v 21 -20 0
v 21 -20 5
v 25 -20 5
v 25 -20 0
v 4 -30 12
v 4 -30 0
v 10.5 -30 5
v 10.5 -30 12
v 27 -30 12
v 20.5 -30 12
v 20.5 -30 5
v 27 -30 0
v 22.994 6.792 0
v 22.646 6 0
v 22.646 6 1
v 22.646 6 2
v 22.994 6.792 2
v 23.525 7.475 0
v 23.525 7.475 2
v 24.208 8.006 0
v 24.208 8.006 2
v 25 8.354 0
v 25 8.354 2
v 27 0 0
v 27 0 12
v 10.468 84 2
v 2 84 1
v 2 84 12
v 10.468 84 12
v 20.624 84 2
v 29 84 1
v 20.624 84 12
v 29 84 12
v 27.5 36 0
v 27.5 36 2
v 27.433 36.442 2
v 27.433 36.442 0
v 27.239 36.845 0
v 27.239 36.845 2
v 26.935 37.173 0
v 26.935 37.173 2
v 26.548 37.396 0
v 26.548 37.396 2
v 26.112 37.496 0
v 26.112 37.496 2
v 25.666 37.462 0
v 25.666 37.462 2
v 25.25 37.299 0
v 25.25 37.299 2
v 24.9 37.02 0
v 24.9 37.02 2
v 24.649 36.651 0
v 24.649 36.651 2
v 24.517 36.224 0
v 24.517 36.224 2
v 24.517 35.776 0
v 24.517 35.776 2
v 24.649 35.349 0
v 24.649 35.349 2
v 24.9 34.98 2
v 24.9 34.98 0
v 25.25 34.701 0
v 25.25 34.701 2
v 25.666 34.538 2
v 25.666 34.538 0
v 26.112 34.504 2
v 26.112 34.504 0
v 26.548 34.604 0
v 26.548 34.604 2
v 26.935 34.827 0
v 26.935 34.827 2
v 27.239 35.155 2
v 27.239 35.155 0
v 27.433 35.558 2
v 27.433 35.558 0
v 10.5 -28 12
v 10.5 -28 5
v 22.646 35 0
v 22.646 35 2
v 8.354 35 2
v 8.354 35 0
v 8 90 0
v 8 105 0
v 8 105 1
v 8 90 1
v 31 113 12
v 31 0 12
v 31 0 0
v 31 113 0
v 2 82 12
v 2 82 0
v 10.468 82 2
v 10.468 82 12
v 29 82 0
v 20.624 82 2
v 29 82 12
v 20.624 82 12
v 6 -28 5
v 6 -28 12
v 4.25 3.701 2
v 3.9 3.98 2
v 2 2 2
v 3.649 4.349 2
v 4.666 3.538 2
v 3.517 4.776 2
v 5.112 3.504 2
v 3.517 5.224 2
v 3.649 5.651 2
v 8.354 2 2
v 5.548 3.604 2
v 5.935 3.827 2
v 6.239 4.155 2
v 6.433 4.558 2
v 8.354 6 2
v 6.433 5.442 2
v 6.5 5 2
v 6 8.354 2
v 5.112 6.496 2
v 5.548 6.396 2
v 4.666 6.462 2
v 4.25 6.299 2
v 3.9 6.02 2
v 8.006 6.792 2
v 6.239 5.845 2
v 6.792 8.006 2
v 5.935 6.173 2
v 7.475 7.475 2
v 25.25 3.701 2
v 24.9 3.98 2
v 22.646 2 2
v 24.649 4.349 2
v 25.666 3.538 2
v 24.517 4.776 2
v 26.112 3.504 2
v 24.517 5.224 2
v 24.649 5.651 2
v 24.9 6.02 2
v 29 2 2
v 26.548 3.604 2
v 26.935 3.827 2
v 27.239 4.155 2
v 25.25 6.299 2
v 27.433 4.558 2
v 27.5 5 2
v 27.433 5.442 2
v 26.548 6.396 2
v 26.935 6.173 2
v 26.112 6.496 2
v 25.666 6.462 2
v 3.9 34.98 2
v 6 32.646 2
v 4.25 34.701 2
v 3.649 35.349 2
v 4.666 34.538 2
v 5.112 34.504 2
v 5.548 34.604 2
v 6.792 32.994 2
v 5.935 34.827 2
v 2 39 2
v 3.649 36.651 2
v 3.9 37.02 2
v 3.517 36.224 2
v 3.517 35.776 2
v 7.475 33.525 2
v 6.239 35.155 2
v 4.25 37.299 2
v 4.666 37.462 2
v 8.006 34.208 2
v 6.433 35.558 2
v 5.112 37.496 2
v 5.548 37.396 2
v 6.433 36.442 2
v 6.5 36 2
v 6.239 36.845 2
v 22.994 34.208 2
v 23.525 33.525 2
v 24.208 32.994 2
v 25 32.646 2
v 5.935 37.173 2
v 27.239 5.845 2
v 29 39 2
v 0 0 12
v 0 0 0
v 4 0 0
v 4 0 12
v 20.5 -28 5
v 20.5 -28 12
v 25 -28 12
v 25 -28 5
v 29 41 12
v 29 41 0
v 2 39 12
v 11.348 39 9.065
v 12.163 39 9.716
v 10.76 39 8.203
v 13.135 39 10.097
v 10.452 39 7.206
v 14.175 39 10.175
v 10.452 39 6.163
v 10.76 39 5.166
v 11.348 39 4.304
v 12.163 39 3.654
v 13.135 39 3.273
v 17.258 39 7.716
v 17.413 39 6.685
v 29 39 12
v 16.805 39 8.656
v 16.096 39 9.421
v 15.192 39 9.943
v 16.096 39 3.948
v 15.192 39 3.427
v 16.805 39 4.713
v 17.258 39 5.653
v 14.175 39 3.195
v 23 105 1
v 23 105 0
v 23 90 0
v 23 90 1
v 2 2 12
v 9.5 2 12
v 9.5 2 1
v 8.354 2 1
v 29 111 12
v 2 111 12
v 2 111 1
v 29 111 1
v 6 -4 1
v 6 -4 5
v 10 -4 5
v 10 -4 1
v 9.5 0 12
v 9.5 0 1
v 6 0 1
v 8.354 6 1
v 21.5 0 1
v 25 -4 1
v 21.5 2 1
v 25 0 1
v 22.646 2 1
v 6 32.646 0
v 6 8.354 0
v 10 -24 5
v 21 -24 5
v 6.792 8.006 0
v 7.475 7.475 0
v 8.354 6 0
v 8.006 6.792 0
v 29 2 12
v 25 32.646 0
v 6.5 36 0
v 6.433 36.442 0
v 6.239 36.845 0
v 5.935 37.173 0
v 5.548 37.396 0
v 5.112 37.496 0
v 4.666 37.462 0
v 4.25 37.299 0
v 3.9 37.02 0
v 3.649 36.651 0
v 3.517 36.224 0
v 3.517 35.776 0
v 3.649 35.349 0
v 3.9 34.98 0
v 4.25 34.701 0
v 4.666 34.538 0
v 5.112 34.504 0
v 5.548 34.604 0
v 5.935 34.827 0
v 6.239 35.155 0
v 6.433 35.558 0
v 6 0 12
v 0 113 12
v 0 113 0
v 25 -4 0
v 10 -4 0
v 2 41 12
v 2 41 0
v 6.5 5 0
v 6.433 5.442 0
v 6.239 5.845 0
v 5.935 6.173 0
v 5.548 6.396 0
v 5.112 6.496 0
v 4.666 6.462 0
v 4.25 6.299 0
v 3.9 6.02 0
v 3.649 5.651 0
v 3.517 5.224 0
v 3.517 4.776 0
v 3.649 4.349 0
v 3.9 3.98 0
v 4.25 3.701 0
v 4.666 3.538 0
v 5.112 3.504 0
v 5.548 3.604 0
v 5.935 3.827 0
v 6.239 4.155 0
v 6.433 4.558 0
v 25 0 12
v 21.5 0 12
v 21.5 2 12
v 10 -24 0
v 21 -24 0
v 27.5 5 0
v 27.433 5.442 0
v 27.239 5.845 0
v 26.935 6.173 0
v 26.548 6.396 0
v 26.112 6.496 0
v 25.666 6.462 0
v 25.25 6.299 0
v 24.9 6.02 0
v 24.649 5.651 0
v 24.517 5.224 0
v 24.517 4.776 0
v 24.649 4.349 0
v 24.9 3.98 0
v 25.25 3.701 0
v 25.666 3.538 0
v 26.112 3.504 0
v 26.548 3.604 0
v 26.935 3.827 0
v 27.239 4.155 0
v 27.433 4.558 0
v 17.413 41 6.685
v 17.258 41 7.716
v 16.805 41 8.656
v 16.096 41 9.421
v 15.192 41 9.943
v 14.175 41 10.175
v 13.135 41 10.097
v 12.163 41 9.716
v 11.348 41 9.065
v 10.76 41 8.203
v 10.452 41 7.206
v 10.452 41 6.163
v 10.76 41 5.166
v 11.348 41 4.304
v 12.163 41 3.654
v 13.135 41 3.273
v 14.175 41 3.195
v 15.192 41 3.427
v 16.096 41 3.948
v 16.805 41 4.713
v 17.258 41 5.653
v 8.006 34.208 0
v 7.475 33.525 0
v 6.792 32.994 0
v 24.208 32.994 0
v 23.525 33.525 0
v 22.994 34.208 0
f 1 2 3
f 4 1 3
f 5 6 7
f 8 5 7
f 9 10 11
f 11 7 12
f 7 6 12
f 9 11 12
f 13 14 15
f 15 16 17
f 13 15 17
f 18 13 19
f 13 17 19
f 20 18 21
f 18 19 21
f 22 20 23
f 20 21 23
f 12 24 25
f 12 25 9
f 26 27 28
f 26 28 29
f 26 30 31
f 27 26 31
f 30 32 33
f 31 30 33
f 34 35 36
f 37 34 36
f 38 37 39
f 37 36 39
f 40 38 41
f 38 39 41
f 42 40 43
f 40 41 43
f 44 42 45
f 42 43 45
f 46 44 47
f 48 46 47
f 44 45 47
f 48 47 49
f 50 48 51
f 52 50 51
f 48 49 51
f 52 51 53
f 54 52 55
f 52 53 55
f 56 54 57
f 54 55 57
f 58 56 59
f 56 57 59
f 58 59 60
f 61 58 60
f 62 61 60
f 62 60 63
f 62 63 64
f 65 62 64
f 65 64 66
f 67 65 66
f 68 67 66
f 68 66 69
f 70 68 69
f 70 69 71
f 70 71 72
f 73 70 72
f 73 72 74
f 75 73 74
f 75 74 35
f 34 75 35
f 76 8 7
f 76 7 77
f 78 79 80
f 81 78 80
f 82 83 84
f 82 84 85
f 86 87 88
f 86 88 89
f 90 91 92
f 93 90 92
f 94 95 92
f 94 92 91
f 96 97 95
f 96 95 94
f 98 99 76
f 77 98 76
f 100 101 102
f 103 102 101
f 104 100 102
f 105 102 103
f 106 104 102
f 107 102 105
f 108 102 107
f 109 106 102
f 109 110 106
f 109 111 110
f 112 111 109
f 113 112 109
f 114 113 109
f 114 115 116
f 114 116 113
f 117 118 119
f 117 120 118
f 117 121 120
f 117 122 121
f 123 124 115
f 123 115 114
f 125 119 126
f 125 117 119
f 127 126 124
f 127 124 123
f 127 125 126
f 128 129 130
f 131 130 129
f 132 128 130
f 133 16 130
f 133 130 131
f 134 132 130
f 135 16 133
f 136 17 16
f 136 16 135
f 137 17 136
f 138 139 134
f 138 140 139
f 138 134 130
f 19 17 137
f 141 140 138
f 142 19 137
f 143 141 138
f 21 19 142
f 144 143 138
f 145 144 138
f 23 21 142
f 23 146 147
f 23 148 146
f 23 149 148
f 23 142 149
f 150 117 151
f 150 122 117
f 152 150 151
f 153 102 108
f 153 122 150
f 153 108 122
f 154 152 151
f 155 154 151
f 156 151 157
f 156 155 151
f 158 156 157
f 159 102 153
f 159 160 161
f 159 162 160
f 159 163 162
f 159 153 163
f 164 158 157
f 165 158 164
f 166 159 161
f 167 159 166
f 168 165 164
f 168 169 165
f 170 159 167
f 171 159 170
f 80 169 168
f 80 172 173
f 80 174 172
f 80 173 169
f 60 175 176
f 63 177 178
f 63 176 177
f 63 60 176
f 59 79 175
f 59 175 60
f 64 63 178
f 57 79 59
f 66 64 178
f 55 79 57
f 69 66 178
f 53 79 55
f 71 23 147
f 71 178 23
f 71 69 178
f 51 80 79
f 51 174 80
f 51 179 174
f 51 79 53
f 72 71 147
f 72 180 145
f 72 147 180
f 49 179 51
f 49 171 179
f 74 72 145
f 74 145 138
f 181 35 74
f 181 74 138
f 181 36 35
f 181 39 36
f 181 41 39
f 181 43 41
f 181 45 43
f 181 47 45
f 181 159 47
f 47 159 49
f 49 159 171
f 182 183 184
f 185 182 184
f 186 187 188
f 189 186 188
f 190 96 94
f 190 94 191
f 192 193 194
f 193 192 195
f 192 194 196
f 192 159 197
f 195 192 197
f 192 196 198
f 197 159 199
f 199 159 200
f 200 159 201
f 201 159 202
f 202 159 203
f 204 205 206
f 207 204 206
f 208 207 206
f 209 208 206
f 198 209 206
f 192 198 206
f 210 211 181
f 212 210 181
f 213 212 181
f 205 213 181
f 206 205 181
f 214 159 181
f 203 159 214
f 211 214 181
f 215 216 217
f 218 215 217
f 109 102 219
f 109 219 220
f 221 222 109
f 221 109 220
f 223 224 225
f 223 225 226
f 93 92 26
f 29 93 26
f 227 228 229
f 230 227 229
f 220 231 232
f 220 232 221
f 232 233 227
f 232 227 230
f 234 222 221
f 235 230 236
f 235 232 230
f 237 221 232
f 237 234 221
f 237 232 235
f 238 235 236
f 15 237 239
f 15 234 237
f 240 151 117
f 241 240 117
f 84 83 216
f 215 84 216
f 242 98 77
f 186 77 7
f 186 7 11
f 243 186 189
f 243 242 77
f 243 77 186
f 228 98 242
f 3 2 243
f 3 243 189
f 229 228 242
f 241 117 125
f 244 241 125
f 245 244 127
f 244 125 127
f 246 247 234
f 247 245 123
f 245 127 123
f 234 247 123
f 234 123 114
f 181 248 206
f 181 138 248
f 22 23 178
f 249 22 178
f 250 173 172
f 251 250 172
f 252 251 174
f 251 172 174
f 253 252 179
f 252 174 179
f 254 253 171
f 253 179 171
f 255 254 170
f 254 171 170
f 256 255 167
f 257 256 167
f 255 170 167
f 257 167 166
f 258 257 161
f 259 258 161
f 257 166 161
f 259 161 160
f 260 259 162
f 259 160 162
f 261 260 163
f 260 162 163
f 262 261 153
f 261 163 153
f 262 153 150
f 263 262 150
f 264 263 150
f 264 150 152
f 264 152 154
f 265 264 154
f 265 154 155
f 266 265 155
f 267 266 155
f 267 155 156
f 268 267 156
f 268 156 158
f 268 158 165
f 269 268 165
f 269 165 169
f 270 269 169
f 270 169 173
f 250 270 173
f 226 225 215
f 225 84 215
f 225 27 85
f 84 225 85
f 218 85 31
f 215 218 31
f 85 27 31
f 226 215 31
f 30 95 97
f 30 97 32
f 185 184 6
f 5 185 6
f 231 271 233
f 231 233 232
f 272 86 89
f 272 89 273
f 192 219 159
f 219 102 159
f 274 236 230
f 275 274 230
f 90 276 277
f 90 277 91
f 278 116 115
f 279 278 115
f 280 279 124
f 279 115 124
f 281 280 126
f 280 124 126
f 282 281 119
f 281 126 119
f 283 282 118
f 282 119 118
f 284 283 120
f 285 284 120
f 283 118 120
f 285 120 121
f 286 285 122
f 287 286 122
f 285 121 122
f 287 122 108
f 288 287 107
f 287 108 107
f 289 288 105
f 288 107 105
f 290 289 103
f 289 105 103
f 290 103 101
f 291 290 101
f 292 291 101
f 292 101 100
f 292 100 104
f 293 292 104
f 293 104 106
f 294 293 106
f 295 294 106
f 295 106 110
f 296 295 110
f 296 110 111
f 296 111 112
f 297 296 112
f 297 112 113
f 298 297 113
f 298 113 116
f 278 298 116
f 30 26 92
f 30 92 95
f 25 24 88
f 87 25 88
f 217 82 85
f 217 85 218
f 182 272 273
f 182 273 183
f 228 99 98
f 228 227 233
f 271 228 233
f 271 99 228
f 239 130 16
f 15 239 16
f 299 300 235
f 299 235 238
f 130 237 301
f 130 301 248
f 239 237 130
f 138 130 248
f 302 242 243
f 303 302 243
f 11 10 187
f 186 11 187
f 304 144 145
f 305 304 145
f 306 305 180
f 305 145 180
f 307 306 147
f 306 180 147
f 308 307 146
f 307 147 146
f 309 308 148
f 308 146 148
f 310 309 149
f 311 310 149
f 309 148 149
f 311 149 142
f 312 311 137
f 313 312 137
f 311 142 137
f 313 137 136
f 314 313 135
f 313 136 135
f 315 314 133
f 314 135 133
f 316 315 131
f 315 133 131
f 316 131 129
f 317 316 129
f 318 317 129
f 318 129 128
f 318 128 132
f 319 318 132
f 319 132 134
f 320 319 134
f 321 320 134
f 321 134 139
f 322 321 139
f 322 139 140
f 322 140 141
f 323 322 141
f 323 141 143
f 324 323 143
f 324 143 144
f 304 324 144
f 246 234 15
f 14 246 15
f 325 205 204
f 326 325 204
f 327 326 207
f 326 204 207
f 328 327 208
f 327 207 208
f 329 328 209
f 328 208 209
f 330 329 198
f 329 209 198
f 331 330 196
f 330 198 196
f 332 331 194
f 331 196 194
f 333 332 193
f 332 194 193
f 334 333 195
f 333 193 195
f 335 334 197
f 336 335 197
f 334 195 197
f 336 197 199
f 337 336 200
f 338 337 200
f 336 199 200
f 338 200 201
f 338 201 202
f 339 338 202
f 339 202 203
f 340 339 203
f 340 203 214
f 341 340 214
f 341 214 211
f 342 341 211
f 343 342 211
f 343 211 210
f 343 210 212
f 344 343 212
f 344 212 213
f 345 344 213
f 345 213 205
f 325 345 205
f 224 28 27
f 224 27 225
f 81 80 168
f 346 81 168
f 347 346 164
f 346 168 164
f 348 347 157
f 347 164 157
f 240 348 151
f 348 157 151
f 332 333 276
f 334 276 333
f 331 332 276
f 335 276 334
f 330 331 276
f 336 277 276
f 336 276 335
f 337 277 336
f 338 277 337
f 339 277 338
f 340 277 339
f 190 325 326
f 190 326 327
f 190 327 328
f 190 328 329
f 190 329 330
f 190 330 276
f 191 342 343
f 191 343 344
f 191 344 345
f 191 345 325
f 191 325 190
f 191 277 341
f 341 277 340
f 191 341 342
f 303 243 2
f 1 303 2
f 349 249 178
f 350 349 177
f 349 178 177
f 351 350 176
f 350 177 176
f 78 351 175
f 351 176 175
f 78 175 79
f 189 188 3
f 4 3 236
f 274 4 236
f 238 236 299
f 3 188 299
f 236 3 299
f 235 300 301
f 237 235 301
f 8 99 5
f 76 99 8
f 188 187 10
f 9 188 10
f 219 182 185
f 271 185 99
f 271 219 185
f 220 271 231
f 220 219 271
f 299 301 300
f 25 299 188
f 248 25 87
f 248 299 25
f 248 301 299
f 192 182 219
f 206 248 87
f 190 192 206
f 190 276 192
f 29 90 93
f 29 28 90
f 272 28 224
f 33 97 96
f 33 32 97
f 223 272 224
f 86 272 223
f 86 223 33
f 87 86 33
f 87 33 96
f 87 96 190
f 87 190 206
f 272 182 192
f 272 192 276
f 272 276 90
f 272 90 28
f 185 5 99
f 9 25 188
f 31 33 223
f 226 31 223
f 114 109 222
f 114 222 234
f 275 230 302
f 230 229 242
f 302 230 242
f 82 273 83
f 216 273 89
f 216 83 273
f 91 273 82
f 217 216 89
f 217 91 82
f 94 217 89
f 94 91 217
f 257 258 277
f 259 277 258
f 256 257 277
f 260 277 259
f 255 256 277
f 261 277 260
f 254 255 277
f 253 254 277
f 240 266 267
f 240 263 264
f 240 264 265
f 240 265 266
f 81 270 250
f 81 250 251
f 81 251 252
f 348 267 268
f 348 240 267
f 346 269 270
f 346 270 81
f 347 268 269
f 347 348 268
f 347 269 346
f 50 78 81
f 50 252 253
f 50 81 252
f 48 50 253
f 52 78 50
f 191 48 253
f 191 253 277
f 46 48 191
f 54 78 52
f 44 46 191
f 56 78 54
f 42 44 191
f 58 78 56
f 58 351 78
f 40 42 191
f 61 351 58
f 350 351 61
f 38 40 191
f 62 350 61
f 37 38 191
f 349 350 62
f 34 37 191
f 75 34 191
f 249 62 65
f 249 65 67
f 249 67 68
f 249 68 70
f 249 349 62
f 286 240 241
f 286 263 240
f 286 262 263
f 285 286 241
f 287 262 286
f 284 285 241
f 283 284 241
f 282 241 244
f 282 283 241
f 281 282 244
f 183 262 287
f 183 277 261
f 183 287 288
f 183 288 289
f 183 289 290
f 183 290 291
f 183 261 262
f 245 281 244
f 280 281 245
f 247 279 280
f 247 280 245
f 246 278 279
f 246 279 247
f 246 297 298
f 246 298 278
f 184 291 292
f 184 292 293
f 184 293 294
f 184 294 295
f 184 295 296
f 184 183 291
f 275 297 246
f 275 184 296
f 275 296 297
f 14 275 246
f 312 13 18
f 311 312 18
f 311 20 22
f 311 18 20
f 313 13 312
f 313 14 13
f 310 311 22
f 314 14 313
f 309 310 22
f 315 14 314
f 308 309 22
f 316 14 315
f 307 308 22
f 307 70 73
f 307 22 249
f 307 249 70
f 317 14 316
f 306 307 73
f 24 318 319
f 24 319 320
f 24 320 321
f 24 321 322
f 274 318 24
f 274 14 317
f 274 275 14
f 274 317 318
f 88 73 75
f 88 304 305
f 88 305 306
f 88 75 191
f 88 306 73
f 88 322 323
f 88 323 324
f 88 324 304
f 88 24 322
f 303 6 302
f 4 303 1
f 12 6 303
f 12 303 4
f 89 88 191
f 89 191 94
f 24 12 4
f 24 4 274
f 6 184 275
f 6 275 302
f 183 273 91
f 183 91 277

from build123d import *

# Parameters (mm, degrees)
F0_W      = 31
F0_H      = 41
F1_DEPTH  = 12
F2_T      = -2
F3_R      = 1.5
F4_DEPTH  = 25
F6_DEPTH  = 25
F7_W      = 14.291796
F7_H      = 4
F8_DEPTH  = 1
F9_W      = 12
F9_H      = 2
F10_DEPTH = 11
F11_W     = 23
F11_H     = 30
F12_DEPTH = 12
F13_W     = 19
F13_H     = 28
F14_DEPTH = 7
F15_W     = 19
F15_H     = 4
F16_DEPTH = 4
F18_DEPTH = 25
F19_R     = 3.5
F20_DEPTH = 25
F21_W     = 27
F21_H     = 27
F22_DEPTH = 12
F23_W     = 27
F23_H     = 27
F23_W_2   = 15
F23_H_2   = 15
F24_DEPTH = 1
F25_W     = 10.156876
F25_H     = 2
F26_DEPTH = 10
F27_W     = 10
F27_H     = 2
F28_DEPTH = 7


with BuildPart() as f1:
    # F0 (on Top) → F1 (new body)
    with BuildSketch(Plane.XY):
        with Locations((15.5, 20.5)):
            Rectangle(F0_W, F0_H)
    extrude(amount=F1_DEPTH)

    # F2
    f2_openings = [f1.faces().sort_by_distance(p)[0] for p in [
        (15.5, 20.5, 12),
    ]]
    offset(amount=F2_T, openings=f2_openings)

    # F3 (on face) → F4 (cut)
    with BuildSketch(Plane.XY.offset(2)):
        with Locations((5, 36)):
            Circle(F3_R)
        with Locations((26, 36)):
            Circle(F3_R)
        with Locations((26, 5)):
            Circle(F3_R)
        with Locations((5, 5)):
            Circle(F3_R)
    extrude(amount=-F4_DEPTH, mode=Mode.SUBTRACT)

    # F5 (on face) → F6 (cut)
    with BuildSketch(Plane.XY.offset(2)):
        with BuildLine():
            ThreePointArc((25, 32.645898), (23.525126, 33.525126), (22.645898, 35))
            Line((22.645898, 35), (8.354102, 35))
            ThreePointArc((8.354102, 35), (7.474874, 33.525126), (6, 32.645898))
            Line((6, 32.645898), (6, 8.354102))
            ThreePointArc((6, 8.354102), (7.474874, 7.474874), (8.354102, 6))
            Line((8.354102, 6), (22.645898, 6))
            ThreePointArc((22.645898, 6), (23.525126, 7.474874), (25, 8.354102))
            Line((25, 8.354102), (25, 32.645898))
        make_face()
    extrude(amount=-F6_DEPTH, mode=Mode.SUBTRACT)

    # F7 (on face) → F8 (cut)
    with BuildSketch(Plane.XY.offset(2)):
        with Locations((15.5, 4)):
            Rectangle(F7_W, F7_H)
    extrude(amount=-F8_DEPTH, mode=Mode.SUBTRACT)

    # F9 (on face) → F10 (cut)
    with BuildSketch(Plane.XY.offset(12)):
        with Locations((15.5, 1)):
            Rectangle(F9_W, F9_H)
    extrude(amount=-F10_DEPTH, mode=Mode.SUBTRACT)

    # F11 (on face) → F12 (join)
    with BuildSketch(Plane(origin=(0, 0, 0), x_dir=(1, 0, 0), z_dir=(0, 0, -1))):
        with Locations((15.5, 15)):
            Rectangle(F11_W, F11_H)
    extrude(amount=-F12_DEPTH)

    # F13 (on face) → F14 (cut)
    with BuildSketch(Plane.XY.offset(12)):
        with Locations((15.5, -14)):
            Rectangle(F13_W, F13_H)
    extrude(amount=-F14_DEPTH, mode=Mode.SUBTRACT)

    # F15 (on face) → F16 (cut)
    with BuildSketch(Plane.XY.offset(5)):
        with Locations((15.5, -2)):
            Rectangle(F15_W, F15_H)
    extrude(amount=-F16_DEPTH, mode=Mode.SUBTRACT)

    # F17 (on face) → F18 (cut)
    with BuildSketch(Plane.XY.offset(5)):
        Polygon((25, -4), (21, -4), (10, -4), (10, -24), (21, -24), (21, -20), (25, -20), align=None)
    extrude(amount=-F18_DEPTH, mode=Mode.SUBTRACT)

    # F19 (on face) → F20 (cut)
    with BuildSketch(Plane.XZ.offset(-39)):
        with Locations((13.913386, 6.684771)):
            Circle(F19_R)
    extrude(amount=-F20_DEPTH, mode=Mode.SUBTRACT)

    # F21 (on face) → F22 (join)
    with BuildSketch(Plane.XY.offset(12)):
        Polygon((29, 41), (31, 41), (31, 113), (0, 113), (0, 41), (2, 41), (2, 82), (29, 82), align=None)
        with Locations((15.5, 97.5)):
            Rectangle(F21_W, F21_H, mode=Mode.SUBTRACT)
    extrude(amount=-F22_DEPTH)

    # F23 (on face) → F24 (join)
    with BuildSketch(Plane(origin=(0, 0, 0), x_dir=(1, 0, 0), z_dir=(0, 0, -1))):
        with Locations((15.5, -97.5)):
            Rectangle(F23_W, F23_H)
        with Locations((15.5, -97.5)):
            Rectangle(F23_W_2, F23_H_2, mode=Mode.SUBTRACT)
    extrude(amount=-F24_DEPTH)

    # F25 (on face) → F26 (cut)
    with BuildSketch(Plane.XY.offset(12)):
        with Locations((15.545943, 83)):
            Rectangle(F25_W, F25_H)
    extrude(amount=-F26_DEPTH, mode=Mode.SUBTRACT)

    # F27 (on face) → F28 (cut)
    with BuildSketch(Plane.XY.offset(12)):
        with Locations((15.5, -29)):
            Rectangle(F27_W, F27_H)
    extrude(amount=-F28_DEPTH, mode=Mode.SUBTRACT)


solid = f1.part
